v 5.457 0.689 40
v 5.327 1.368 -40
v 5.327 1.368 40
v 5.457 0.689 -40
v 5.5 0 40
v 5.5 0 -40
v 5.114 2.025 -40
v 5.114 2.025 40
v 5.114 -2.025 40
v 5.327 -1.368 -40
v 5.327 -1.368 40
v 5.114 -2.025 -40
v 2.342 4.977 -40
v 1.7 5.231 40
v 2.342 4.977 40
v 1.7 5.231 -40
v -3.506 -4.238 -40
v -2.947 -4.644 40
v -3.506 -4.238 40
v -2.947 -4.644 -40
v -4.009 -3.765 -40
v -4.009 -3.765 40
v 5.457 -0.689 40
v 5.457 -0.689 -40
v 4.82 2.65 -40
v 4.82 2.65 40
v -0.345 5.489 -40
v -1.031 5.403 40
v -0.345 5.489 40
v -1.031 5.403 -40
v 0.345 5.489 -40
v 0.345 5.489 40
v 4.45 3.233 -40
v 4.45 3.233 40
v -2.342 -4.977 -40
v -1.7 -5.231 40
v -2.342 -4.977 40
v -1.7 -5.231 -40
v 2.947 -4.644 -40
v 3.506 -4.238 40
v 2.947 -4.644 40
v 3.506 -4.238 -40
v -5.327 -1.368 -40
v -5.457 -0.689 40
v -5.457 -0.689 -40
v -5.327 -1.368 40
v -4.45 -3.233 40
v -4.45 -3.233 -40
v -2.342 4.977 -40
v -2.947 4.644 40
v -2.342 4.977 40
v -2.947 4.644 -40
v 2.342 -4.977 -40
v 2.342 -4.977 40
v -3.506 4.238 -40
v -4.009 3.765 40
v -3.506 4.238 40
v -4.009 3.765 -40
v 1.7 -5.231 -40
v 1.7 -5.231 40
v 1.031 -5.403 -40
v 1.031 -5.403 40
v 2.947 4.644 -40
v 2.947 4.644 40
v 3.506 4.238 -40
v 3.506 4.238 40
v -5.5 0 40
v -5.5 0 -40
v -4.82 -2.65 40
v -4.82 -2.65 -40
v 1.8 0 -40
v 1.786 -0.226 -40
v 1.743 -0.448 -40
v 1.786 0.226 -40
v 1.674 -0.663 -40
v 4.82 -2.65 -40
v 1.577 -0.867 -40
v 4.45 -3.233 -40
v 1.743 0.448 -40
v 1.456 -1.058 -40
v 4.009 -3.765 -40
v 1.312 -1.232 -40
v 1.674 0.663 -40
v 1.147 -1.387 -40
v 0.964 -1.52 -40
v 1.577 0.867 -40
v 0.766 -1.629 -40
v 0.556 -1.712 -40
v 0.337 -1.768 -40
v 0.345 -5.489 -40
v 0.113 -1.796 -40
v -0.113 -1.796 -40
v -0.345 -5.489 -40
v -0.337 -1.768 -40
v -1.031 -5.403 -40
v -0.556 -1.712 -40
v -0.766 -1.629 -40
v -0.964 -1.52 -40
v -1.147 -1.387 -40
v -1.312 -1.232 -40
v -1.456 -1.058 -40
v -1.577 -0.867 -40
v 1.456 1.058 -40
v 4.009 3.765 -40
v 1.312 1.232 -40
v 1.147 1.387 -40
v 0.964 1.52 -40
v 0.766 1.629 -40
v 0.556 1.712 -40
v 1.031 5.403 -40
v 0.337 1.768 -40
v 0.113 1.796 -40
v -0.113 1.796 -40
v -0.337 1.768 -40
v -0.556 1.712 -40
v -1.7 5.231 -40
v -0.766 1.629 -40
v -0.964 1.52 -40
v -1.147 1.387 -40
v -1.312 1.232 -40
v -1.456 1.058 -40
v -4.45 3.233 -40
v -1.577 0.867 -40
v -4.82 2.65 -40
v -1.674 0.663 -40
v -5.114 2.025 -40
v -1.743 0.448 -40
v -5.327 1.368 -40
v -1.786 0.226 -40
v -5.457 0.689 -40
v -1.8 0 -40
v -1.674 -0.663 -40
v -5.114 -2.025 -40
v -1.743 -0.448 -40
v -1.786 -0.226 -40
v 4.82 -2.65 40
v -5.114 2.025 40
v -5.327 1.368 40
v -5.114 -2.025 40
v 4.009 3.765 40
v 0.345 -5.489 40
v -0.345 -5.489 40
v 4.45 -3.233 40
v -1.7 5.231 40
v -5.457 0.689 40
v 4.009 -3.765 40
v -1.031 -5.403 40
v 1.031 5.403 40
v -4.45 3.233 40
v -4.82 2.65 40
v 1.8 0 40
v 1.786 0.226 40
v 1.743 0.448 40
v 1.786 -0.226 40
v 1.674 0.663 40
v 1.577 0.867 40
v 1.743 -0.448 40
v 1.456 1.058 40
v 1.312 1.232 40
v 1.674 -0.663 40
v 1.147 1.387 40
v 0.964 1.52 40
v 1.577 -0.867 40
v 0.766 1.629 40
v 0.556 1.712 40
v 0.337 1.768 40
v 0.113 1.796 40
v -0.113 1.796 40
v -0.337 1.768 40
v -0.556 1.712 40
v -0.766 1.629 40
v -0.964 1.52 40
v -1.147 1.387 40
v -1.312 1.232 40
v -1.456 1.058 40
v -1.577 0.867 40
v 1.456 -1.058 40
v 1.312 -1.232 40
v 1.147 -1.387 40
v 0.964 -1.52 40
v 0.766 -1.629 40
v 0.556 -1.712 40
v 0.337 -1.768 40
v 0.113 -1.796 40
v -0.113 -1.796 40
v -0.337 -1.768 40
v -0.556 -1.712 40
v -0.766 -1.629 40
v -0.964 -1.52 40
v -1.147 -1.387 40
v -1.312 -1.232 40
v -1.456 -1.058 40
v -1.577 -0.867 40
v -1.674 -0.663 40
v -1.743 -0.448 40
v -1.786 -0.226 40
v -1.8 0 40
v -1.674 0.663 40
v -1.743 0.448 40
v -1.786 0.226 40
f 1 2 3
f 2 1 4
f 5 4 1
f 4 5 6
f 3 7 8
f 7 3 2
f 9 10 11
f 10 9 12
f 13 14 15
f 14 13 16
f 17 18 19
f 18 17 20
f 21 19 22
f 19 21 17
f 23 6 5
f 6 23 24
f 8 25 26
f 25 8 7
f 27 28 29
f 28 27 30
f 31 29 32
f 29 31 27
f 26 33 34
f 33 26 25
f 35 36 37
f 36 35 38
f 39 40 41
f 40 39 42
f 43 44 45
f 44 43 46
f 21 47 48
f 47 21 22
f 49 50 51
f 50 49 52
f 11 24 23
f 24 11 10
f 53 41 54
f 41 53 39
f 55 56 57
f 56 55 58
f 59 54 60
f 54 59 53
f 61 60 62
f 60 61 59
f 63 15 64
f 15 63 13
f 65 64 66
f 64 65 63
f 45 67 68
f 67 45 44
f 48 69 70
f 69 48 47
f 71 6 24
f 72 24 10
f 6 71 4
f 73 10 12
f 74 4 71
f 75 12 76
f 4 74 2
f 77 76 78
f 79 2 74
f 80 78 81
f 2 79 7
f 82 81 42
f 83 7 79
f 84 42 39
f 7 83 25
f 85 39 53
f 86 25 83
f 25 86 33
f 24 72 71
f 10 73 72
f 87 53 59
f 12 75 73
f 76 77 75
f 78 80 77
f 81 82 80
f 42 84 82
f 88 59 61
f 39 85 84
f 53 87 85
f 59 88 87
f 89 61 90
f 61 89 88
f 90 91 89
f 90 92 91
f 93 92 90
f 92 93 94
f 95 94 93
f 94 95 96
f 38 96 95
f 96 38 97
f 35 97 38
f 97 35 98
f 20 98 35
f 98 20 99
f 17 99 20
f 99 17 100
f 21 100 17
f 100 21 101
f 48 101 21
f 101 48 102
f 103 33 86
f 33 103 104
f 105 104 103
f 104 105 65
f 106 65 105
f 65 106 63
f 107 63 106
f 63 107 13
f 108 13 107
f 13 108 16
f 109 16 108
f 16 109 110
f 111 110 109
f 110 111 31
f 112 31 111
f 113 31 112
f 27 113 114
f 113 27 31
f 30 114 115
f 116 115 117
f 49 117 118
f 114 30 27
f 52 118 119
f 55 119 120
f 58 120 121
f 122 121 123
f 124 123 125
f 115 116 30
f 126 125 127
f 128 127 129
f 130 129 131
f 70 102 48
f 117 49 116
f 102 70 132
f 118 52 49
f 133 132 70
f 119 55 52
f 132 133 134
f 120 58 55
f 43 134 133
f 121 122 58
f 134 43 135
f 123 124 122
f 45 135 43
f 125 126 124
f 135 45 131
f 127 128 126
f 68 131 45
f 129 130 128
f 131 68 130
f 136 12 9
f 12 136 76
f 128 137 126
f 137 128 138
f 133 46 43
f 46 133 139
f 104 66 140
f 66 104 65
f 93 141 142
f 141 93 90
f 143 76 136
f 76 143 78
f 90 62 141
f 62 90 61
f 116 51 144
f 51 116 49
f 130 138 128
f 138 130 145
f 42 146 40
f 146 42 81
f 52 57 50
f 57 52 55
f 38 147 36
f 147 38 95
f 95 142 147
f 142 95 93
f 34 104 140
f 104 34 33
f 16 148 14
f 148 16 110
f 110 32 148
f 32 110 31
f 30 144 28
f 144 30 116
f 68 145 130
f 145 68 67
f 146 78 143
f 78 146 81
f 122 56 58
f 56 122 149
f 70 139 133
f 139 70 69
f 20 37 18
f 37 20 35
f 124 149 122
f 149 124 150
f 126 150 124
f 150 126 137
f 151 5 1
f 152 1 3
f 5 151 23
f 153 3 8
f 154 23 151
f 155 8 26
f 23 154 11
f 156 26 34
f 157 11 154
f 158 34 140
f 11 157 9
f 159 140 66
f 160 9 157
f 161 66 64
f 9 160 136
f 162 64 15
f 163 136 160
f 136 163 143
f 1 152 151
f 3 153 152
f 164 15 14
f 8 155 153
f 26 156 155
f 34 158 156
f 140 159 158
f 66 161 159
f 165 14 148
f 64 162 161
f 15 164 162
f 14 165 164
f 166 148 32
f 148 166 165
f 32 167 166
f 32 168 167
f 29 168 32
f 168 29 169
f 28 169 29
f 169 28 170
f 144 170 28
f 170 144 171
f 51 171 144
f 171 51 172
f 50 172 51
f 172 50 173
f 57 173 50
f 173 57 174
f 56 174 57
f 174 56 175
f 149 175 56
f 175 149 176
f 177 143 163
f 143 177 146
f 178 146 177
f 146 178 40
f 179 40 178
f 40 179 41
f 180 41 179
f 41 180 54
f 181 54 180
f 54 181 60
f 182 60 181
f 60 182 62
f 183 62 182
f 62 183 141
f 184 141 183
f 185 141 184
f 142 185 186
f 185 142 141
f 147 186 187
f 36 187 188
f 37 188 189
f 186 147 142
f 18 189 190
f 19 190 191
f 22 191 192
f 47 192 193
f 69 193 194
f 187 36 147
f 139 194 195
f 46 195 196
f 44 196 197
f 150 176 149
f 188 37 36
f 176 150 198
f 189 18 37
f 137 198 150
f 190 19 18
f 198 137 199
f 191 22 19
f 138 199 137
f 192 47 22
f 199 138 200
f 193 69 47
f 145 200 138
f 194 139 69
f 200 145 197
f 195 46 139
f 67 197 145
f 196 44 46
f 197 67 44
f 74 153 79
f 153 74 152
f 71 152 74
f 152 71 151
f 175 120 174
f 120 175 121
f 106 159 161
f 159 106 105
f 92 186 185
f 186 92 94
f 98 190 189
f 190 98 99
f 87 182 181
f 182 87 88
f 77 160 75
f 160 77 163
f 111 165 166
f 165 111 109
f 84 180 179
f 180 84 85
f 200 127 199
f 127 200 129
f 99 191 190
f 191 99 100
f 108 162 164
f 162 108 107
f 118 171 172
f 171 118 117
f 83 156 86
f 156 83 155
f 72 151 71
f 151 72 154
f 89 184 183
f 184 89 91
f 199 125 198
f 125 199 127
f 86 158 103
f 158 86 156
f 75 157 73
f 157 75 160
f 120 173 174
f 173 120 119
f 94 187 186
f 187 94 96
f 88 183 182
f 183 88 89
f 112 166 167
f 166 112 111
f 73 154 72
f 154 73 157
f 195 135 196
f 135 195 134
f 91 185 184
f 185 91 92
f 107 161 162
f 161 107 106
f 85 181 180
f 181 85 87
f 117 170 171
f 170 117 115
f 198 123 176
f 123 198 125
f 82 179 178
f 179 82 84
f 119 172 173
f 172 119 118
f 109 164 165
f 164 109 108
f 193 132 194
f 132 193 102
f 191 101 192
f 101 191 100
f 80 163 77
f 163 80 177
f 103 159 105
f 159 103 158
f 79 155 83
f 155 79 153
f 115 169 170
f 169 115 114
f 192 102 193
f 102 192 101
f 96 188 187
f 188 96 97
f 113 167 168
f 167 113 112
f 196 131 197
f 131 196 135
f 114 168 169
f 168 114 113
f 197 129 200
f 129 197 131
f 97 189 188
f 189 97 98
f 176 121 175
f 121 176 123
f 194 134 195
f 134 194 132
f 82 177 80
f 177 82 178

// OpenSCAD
$fn = 50;


difference() {
	union() {
		translate(v = [0, 0, -40.0000000000]) {
			cylinder(h = 80, r = 5.5000000000);
		}
	}
	union() {
		#translate(v = [0, 0, -100.0000000000]) {
			cylinder(h = 200, r = 1.8000000000);
		}
	}
}
